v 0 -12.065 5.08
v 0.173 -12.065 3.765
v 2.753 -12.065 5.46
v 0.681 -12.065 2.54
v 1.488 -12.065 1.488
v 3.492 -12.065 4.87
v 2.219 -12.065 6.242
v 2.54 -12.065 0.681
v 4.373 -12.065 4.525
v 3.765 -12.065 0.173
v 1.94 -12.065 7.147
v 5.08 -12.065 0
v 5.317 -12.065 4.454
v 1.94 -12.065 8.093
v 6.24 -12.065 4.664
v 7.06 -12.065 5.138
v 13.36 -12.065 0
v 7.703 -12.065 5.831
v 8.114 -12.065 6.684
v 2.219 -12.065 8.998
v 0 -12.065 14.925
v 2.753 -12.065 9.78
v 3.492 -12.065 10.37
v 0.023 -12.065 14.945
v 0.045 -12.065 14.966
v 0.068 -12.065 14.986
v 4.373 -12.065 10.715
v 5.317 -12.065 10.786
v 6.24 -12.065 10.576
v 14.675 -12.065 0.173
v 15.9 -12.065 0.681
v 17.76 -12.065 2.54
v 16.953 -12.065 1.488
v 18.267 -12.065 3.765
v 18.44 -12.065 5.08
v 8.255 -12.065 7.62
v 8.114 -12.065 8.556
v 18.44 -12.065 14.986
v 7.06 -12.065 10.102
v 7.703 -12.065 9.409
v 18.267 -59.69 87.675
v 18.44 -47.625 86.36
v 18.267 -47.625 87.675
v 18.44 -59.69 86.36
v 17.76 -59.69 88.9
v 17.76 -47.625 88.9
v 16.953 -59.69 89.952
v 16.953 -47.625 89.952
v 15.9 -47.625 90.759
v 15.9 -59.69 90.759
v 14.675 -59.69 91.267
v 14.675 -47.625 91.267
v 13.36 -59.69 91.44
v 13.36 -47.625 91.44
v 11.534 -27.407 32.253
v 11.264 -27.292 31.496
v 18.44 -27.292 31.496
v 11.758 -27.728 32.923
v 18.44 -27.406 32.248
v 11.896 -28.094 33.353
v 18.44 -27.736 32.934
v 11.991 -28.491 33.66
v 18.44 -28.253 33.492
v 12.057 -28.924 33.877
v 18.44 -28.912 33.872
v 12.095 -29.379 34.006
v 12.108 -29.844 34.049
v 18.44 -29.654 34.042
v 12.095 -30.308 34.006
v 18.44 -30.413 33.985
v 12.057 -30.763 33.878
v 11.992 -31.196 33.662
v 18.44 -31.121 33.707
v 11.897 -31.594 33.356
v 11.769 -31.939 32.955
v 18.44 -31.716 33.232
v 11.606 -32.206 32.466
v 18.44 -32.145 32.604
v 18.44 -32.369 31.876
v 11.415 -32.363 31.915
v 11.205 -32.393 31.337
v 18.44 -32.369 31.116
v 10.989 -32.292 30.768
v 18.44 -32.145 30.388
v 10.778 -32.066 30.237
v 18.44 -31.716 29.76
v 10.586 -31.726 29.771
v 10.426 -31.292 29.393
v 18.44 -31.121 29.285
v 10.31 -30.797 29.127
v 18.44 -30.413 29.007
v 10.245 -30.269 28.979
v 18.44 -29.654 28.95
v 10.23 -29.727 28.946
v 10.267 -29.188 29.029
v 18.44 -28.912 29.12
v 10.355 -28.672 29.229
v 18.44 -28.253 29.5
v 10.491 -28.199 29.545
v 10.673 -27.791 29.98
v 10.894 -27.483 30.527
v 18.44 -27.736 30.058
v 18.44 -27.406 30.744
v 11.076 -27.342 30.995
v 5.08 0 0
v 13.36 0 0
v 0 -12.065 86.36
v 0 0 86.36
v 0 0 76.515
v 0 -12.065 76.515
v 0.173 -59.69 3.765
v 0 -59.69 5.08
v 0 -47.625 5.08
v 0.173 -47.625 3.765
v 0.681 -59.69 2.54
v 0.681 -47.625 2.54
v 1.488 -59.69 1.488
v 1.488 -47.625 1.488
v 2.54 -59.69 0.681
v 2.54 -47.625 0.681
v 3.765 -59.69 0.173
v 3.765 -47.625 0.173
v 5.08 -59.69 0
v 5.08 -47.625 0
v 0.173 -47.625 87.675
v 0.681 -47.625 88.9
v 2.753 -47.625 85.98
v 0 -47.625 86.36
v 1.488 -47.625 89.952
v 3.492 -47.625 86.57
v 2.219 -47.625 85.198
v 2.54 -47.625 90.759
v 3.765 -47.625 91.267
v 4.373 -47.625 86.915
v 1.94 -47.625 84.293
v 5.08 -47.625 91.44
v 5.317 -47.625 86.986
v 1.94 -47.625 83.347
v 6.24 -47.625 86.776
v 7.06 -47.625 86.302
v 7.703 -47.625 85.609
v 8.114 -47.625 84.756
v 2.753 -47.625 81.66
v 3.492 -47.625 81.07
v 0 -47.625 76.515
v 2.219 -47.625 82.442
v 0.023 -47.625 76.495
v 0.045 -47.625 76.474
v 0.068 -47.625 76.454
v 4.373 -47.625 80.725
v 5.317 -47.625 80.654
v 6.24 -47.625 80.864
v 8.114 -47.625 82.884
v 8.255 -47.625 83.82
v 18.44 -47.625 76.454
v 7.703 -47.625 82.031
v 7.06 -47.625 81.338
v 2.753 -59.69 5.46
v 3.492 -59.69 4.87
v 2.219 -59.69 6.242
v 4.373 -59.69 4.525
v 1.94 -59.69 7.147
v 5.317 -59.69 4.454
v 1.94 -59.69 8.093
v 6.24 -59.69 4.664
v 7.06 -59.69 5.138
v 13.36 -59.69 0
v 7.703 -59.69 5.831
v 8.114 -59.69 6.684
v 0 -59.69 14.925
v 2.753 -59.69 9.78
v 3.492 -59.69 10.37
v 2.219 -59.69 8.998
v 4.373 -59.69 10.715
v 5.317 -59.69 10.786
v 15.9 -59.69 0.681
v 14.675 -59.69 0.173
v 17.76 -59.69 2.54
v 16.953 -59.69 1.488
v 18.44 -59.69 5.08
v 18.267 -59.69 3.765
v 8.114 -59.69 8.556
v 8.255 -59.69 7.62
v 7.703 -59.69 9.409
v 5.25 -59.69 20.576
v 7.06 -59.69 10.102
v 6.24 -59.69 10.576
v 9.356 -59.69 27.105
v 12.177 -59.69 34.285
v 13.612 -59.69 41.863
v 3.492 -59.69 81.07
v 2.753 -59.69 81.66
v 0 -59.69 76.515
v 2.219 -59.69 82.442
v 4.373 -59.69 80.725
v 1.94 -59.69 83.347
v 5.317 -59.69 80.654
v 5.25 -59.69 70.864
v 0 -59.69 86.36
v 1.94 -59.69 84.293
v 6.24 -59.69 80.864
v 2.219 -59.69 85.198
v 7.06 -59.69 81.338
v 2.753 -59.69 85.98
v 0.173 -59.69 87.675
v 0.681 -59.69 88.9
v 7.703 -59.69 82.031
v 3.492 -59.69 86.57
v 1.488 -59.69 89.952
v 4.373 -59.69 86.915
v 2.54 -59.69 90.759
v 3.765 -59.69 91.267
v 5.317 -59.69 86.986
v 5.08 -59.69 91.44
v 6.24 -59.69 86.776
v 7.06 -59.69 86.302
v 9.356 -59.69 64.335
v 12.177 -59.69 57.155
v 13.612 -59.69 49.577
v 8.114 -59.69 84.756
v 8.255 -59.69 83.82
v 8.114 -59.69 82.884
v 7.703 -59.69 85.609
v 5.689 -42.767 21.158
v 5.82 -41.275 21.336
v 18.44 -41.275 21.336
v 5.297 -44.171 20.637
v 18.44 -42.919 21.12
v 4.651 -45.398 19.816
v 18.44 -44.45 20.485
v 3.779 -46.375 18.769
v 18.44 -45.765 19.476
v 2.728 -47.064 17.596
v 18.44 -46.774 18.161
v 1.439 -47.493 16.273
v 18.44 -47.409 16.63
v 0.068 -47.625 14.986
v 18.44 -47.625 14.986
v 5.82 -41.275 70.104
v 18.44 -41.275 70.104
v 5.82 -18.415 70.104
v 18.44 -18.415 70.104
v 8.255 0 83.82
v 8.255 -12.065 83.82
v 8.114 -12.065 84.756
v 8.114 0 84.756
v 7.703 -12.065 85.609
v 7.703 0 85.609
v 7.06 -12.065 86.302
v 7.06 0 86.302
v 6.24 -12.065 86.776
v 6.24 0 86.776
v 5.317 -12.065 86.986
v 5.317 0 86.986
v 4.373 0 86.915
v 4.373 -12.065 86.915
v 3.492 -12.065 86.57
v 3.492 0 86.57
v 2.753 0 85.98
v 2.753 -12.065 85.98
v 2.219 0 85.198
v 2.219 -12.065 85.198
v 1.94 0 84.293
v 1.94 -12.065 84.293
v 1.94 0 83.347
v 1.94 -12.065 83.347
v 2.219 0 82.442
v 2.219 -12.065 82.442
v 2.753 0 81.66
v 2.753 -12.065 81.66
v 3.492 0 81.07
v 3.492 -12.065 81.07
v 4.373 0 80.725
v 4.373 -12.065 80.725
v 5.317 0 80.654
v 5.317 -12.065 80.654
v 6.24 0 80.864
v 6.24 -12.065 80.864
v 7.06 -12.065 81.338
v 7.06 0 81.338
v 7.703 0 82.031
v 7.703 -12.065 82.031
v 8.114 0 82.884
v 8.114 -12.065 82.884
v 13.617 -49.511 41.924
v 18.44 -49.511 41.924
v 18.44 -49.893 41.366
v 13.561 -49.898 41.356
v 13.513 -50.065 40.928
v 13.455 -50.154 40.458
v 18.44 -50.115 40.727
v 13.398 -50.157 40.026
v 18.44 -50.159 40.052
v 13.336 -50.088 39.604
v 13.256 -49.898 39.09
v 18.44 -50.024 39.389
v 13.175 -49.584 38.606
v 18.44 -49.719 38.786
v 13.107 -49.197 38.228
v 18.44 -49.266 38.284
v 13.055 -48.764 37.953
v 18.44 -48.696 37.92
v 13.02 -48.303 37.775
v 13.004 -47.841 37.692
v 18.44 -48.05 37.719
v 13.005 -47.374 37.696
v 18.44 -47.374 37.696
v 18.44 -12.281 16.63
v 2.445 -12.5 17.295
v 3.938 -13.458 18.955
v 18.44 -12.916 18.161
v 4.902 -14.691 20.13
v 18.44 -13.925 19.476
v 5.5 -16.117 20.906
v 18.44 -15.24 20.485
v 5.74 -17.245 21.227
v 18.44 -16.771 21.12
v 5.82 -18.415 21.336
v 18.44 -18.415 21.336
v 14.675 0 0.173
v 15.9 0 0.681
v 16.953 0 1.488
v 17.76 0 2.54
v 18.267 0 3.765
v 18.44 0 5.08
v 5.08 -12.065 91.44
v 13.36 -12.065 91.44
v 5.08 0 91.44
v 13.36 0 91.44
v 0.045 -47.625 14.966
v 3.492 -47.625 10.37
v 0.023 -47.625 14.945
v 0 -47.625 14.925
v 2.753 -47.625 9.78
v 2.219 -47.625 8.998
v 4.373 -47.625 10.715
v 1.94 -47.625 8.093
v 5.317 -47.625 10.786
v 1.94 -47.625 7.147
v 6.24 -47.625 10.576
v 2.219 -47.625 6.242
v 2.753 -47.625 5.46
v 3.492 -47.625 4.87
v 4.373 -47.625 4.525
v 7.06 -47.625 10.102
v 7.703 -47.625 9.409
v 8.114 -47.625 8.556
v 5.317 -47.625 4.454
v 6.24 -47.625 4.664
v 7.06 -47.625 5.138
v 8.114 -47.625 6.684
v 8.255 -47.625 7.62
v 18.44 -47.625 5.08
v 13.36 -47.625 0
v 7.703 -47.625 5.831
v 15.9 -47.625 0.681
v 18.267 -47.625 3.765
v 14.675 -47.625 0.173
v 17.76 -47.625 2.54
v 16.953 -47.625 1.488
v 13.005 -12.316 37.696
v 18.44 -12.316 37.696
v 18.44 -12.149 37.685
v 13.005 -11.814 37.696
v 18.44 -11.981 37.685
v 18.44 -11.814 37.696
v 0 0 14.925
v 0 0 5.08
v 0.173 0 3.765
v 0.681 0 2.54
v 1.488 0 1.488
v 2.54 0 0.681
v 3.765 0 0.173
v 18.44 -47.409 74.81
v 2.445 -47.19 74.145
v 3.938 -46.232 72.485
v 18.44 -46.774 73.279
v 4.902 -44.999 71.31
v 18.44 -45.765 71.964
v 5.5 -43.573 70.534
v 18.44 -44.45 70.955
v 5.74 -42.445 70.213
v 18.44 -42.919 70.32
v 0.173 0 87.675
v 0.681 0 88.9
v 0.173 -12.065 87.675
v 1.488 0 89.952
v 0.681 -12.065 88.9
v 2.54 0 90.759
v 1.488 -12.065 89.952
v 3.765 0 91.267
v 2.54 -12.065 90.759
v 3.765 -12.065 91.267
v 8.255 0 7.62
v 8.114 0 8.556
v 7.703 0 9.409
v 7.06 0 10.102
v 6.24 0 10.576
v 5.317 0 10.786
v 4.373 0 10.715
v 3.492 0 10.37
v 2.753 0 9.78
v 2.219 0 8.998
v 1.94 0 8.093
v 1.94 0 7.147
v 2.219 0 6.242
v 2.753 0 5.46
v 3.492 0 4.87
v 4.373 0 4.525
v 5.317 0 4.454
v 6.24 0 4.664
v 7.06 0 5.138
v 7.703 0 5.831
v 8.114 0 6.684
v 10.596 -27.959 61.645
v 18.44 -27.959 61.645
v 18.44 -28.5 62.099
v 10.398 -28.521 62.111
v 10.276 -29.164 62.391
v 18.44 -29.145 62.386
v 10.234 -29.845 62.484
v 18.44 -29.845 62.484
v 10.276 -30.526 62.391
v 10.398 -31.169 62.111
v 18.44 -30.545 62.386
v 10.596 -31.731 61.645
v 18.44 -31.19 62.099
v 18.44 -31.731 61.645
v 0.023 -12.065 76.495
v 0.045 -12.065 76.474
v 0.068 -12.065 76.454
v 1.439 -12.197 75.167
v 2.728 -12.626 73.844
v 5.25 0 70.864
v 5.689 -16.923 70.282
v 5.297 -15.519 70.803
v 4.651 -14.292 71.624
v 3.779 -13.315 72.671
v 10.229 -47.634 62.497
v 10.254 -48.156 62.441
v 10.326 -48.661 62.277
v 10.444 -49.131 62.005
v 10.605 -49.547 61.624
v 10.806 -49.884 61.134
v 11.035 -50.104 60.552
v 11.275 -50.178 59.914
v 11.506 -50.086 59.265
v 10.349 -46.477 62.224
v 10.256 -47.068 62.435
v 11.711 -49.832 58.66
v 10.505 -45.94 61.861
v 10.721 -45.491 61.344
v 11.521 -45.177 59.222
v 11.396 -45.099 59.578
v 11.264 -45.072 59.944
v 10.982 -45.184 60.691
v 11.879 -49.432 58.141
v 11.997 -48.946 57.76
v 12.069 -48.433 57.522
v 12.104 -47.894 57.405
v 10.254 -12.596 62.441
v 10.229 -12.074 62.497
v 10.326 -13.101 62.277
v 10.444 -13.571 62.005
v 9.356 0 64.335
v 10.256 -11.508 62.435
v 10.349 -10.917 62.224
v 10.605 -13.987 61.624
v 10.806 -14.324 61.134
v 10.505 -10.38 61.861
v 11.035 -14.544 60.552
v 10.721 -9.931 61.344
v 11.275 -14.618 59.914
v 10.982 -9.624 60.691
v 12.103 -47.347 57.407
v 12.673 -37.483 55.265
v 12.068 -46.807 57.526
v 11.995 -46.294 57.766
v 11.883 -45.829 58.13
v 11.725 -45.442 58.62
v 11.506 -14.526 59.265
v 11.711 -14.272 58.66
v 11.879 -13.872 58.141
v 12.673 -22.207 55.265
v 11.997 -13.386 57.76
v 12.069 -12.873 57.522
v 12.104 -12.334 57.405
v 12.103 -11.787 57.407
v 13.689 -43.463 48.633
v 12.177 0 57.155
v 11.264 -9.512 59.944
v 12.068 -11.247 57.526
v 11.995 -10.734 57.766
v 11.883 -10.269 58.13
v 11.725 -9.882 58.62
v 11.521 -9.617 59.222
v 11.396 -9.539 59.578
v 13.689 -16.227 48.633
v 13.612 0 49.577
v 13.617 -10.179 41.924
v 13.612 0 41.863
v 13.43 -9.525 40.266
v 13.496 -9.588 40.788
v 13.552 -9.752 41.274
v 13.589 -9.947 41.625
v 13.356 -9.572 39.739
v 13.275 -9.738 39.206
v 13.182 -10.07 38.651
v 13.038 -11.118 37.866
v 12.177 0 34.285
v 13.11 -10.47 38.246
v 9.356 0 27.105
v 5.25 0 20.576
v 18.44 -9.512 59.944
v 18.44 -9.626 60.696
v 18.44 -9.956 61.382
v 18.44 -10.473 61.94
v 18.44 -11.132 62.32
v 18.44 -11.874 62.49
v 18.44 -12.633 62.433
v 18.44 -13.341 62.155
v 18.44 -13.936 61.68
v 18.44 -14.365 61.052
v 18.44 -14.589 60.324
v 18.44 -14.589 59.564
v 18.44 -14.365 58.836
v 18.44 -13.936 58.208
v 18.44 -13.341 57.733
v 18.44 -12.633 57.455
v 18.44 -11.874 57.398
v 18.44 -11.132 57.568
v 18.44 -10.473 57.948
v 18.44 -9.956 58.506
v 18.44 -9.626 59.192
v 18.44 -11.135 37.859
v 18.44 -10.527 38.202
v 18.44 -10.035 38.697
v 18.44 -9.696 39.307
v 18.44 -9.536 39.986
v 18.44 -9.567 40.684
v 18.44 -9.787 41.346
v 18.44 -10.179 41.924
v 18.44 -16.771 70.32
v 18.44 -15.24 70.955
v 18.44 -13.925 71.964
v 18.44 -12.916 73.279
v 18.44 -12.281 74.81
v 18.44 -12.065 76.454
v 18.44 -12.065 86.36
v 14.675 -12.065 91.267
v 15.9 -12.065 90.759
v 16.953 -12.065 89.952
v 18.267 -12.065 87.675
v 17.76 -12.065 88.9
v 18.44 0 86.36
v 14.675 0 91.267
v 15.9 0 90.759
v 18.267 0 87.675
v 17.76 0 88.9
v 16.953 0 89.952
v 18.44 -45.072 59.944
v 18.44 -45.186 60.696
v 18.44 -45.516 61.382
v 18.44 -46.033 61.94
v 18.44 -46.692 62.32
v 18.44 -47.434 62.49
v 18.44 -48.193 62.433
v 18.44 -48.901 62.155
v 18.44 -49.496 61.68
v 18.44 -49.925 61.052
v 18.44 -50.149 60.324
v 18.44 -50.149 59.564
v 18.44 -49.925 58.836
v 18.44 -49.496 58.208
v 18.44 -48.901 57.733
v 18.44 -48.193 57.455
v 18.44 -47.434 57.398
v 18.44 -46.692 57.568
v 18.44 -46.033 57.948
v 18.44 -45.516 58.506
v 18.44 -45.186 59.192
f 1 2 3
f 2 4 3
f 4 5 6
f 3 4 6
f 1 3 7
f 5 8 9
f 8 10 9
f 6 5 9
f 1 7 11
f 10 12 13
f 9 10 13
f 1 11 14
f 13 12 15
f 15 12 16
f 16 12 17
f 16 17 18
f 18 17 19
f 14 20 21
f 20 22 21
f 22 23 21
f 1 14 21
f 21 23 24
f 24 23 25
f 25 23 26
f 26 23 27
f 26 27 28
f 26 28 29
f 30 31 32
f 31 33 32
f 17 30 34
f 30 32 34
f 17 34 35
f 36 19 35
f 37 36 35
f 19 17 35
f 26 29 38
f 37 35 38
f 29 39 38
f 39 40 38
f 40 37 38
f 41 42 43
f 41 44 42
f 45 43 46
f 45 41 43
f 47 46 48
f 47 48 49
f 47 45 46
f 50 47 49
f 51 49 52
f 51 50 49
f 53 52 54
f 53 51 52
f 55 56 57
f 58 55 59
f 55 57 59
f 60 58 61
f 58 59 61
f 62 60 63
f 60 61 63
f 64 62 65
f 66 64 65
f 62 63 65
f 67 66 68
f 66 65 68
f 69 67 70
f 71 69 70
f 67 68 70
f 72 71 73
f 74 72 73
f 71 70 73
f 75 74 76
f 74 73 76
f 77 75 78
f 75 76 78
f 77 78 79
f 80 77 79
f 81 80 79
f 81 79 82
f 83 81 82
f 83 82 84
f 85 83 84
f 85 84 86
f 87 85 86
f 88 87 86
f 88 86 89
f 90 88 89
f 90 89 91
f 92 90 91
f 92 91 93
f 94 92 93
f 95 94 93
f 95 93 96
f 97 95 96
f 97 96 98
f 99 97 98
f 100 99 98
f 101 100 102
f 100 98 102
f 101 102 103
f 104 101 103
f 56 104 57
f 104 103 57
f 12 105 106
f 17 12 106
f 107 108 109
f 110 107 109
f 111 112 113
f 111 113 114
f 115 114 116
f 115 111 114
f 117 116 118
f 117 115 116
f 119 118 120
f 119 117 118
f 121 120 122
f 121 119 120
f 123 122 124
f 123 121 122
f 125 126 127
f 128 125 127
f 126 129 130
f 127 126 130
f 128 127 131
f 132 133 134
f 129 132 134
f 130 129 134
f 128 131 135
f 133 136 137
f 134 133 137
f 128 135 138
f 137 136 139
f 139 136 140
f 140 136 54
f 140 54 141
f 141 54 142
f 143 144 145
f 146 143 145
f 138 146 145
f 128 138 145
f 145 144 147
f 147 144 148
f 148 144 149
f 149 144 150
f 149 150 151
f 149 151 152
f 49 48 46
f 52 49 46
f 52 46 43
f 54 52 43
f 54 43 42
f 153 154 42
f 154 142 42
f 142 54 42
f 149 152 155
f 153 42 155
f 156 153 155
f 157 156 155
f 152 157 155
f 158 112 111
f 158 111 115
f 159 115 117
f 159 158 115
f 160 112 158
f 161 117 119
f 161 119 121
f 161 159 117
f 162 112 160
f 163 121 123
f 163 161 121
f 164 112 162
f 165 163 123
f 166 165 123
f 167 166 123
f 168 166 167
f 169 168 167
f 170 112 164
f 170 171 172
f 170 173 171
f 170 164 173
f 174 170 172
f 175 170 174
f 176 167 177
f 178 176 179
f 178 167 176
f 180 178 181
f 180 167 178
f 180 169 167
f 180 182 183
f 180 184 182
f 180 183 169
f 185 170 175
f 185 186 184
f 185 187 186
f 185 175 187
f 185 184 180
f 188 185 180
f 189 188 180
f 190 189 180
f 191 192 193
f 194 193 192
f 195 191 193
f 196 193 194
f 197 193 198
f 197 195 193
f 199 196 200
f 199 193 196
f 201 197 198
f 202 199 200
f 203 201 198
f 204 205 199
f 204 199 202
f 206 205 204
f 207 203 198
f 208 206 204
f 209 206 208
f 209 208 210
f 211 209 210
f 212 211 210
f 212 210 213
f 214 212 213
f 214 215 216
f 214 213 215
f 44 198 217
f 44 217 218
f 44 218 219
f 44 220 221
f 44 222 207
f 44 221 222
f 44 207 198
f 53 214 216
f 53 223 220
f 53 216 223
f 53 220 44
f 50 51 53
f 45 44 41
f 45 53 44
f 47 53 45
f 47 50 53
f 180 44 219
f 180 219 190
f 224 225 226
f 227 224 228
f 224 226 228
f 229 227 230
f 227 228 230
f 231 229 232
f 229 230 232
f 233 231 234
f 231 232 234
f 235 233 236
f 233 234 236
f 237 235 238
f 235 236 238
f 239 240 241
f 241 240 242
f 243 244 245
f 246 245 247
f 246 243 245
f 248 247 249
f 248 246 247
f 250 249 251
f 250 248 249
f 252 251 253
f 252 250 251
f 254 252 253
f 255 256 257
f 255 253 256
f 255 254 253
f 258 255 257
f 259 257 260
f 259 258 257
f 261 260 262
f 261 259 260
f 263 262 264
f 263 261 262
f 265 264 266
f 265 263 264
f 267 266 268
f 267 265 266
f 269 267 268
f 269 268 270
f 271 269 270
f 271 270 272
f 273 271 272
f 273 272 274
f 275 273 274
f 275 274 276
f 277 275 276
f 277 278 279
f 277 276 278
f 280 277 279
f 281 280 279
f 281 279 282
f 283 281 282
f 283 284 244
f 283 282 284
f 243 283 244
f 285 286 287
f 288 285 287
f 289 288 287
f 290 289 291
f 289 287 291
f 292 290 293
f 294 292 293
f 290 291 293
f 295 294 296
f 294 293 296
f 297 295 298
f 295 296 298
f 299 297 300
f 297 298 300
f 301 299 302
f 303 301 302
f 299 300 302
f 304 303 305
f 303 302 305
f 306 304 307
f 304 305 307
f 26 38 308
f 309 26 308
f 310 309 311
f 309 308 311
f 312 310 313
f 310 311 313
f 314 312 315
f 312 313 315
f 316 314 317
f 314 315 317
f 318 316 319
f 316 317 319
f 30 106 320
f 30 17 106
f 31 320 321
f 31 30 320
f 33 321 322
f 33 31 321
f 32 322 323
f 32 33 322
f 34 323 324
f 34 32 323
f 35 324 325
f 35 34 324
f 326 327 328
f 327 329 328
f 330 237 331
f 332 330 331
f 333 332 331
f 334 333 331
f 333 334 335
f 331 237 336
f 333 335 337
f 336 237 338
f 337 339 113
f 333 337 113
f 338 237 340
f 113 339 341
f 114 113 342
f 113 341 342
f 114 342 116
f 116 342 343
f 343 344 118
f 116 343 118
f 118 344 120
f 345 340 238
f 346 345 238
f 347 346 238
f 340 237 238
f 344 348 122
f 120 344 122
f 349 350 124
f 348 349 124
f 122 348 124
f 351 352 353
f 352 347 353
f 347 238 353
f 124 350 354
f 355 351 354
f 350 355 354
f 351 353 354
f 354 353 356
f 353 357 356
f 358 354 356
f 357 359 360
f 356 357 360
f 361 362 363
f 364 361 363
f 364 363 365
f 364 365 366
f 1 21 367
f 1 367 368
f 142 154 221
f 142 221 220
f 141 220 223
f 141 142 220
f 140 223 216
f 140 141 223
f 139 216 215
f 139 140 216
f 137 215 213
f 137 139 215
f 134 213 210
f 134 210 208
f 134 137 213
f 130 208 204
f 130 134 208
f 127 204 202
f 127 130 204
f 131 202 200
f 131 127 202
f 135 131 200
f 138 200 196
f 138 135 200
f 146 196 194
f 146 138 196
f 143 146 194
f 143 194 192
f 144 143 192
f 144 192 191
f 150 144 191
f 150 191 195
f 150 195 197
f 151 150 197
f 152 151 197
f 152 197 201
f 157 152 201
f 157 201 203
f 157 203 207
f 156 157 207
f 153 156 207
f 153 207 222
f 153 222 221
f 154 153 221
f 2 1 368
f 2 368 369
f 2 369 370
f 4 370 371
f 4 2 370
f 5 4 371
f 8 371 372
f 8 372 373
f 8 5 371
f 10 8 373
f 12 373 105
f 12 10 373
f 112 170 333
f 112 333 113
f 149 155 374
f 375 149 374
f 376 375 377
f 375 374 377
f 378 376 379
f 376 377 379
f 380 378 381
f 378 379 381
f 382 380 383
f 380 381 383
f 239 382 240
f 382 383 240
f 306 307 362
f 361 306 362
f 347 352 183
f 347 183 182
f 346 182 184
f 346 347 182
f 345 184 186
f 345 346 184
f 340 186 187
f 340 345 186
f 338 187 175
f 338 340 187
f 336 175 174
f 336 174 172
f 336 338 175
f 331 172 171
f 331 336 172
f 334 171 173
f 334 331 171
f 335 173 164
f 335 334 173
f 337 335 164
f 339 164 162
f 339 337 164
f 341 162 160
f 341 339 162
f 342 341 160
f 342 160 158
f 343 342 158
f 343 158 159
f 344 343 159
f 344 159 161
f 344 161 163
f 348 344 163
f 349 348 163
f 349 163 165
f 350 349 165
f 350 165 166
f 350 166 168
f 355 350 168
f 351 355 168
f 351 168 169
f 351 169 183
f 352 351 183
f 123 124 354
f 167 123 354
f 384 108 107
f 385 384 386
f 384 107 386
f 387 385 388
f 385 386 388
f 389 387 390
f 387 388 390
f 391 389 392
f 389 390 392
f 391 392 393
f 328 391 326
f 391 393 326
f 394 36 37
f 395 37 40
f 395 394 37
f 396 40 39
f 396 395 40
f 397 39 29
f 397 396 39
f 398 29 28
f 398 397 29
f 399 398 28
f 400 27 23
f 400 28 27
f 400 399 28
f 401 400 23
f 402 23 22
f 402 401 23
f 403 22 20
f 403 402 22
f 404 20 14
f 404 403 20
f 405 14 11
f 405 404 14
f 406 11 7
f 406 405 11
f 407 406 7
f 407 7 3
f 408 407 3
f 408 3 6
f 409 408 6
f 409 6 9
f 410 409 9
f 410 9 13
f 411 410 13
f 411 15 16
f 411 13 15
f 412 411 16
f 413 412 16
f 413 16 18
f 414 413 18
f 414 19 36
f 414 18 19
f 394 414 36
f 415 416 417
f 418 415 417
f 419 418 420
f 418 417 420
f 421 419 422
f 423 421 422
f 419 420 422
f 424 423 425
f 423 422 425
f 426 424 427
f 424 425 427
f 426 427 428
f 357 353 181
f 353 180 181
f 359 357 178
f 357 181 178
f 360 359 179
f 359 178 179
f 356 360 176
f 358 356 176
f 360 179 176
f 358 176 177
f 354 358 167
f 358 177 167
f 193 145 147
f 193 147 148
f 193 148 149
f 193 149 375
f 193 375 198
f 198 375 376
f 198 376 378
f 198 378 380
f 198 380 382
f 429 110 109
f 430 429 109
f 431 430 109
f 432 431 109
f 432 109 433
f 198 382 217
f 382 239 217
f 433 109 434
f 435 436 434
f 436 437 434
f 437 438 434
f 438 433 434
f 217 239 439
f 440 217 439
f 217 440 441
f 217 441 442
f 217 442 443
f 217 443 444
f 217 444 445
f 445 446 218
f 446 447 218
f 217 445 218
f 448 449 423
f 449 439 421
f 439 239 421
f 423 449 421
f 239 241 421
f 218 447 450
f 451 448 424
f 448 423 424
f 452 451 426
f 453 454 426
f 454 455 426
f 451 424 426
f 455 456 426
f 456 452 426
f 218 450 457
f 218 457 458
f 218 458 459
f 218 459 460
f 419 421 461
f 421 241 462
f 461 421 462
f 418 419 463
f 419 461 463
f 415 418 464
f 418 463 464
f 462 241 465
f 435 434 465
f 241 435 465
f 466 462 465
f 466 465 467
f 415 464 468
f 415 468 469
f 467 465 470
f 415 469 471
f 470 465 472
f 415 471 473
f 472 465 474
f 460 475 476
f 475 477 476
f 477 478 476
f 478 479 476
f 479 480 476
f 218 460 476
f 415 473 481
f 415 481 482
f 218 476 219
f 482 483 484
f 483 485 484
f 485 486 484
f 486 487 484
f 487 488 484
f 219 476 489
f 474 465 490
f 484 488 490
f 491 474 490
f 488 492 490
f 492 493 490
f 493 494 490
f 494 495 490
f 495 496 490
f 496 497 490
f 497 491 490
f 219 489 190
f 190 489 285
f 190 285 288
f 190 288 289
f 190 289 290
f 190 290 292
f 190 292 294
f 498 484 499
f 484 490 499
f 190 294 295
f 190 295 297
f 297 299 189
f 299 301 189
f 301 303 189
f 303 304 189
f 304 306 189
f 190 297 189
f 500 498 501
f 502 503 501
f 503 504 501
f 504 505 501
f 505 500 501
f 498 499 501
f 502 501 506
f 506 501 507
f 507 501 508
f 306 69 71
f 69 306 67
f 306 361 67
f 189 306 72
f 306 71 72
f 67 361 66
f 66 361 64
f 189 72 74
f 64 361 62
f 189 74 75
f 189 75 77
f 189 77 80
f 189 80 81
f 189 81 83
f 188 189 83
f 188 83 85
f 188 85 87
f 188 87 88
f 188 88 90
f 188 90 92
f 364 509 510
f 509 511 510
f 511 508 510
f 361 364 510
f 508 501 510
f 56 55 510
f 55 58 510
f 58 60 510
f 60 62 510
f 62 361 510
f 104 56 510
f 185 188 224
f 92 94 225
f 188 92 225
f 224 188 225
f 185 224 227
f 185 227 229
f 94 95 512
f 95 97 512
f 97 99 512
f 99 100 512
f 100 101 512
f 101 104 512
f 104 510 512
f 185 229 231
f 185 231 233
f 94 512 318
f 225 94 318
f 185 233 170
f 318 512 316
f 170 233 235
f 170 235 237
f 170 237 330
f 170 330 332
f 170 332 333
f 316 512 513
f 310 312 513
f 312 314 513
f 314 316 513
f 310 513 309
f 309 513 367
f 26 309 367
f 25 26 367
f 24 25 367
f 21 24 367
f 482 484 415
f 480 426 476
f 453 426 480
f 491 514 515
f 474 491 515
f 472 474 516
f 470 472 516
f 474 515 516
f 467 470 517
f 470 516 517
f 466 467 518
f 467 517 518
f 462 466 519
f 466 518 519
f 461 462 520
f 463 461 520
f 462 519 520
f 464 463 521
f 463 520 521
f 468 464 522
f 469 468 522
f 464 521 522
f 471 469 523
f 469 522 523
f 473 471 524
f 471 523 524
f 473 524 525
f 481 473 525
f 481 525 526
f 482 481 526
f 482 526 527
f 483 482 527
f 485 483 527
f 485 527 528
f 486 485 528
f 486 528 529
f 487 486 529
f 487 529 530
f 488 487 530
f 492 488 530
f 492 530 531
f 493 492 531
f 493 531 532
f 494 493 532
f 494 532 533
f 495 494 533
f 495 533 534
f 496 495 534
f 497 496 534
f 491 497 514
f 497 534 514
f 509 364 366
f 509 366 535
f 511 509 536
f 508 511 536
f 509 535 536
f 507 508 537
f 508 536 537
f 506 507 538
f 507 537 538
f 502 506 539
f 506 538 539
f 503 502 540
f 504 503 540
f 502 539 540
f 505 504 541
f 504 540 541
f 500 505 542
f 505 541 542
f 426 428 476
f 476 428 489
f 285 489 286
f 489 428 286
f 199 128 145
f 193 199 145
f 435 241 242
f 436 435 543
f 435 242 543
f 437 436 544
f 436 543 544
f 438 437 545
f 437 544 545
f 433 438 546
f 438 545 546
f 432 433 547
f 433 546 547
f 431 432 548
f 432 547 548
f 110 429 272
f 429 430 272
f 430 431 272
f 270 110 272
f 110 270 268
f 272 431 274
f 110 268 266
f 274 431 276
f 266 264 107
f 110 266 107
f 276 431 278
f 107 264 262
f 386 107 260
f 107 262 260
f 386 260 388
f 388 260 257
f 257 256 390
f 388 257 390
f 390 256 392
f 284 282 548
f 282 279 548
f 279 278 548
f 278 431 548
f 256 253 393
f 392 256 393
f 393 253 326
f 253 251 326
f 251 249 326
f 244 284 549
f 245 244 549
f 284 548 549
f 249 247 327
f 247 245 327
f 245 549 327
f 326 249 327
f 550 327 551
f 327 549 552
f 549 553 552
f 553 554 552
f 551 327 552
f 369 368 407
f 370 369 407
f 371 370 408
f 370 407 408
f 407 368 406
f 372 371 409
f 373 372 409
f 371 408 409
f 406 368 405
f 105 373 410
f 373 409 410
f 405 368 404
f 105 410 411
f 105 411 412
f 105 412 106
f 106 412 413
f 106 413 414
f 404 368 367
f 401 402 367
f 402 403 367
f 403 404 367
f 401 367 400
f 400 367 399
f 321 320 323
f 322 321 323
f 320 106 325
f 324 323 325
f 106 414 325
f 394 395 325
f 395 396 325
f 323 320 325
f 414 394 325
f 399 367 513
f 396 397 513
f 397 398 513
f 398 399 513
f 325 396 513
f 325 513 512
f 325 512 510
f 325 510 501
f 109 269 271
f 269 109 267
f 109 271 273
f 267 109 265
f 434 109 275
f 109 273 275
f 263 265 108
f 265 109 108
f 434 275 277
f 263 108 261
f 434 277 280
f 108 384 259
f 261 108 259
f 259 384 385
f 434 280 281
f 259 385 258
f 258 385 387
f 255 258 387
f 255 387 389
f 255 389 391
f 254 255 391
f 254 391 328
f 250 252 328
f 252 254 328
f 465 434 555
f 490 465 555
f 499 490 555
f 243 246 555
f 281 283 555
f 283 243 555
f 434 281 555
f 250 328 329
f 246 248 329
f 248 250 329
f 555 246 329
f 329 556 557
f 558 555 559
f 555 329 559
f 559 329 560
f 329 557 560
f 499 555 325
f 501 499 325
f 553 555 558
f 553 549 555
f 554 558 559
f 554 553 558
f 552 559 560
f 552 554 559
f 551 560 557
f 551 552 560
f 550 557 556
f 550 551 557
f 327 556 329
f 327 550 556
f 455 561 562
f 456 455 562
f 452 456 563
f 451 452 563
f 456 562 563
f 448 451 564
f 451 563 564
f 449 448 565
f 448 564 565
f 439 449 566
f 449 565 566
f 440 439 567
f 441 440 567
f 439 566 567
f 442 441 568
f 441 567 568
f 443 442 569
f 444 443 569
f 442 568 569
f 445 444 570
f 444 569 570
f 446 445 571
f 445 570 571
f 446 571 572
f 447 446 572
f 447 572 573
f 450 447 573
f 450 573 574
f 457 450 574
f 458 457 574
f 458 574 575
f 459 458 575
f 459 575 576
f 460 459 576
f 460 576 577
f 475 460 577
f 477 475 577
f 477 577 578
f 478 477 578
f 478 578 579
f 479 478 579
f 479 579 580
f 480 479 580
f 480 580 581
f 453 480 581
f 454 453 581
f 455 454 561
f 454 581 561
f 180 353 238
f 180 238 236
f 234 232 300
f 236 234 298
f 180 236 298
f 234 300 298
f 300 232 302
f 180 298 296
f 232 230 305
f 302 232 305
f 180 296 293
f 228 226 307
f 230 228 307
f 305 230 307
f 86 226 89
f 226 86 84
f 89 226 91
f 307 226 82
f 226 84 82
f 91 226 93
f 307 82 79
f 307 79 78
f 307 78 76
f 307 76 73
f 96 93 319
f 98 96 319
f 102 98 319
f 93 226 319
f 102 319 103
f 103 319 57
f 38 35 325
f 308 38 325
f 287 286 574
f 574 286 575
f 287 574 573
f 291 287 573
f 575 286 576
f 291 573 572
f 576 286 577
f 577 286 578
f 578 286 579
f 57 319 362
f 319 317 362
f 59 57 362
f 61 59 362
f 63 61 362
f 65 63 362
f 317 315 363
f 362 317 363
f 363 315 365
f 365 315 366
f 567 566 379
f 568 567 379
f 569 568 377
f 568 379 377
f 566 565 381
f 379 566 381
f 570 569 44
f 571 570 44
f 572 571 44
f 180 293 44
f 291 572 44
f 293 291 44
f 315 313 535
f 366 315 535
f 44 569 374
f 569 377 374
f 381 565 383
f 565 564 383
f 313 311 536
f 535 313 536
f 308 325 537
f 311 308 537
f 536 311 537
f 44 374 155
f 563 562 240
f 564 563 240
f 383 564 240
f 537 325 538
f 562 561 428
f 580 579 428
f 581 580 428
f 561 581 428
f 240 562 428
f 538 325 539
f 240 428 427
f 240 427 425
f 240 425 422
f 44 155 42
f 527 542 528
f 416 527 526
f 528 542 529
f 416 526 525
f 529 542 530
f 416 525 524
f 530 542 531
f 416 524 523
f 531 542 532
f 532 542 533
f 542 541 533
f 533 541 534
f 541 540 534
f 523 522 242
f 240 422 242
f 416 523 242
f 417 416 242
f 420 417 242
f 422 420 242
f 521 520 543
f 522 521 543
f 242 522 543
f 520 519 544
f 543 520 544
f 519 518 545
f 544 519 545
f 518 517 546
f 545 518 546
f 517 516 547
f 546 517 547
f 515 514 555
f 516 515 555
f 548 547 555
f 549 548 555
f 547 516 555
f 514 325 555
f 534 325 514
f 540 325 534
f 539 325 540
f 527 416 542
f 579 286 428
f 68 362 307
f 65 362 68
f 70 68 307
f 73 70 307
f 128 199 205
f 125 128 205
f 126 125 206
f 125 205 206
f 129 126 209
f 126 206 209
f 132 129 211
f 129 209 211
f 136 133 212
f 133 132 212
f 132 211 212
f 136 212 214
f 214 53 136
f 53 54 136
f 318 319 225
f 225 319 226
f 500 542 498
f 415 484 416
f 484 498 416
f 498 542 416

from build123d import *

# Parameters (mm, degrees)
F0_R     = 3.175
F1_DEPTH = 59.69
F2_R     = 5.08
F3_R     = 2.5527
F4_DEPTH = 18.4414
F5_R     = 5.08


with BuildPart() as f1:
    # F0 (on Front) → F1 (new body)
    with BuildSketch(Plane.XZ):
        with BuildLine():
            Line((0, 14.925174), (0, 0))
            Line((0, 0), (18.4404, 0))
            Line((18.4404, 0), (18.4404, 91.44))
            Line((18.4404, 91.44), (0, 91.44))
            Line((0, 91.44), (0, 76.514826))
            ThreePointArc((0, 76.514826), (13.7922, 45.72), (0, 14.925174))
        make_face()
        with Locations((5.08, 7.62)):
            Circle(F0_R, mode=Mode.SUBTRACT)
        with Locations((5.08, 83.82)):
            Circle(F0_R, mode=Mode.SUBTRACT)
    extrude(amount=F1_DEPTH)

    # F2
    f2_edges = [f1.edges().sort_by_distance(p)[0] for p in [
        (0, -29.845, 91.44),
        (0, -29.845, 0),
    ]]
    fillet(f2_edges, radius=F2_R)

    # F3 (on face) → F4 (cut, through all)
    with BuildSketch(Plane.YZ.offset(18.4404)):
        with Locations((-47.625, 59.944)):
            Circle(F3_R)
        with Locations((-12.065, 59.944)):
            Circle(F3_R)
        with Locations((-29.845, 31.496)):
            Circle(F3_R)
        with BuildLine():
            Line((-12.065, 91.44), (-47.625, 91.44))
            Line((-47.625, 91.44), (-47.625, 76.454))
            ThreePointArc((-47.625, 76.454), (-45.765128, 71.963872), (-41.275, 70.104))
            Line((-41.275, 70.104), (-18.415, 70.104))
            ThreePointArc((-18.415, 70.104), (-13.924872, 71.963872), (-12.065, 76.454))
            Line((-12.065, 76.454), (-12.065, 91.44))
        make_face()
        with BuildLine():
            Line((-47.625, 14.986), (-47.625, 0))
            Line((-47.625, 0), (-12.065, 0))
            Line((-12.065, 0), (-12.065, 14.986))
            ThreePointArc((-12.065, 14.986), (-13.924872, 19.476128), (-18.415, 21.336))
            Line((-18.415, 21.336), (-41.275, 21.336))
            ThreePointArc((-41.275, 21.336), (-45.765128, 19.476128), (-47.625, 14.986))
        make_face()
        with BuildLine():
            Line((-10.178521, 41.924013), (-27.958521, 61.644822))
            ThreePointArc((-27.958521, 61.644822), (-29.845, 62.484), (-31.731479, 61.644822))
            Line((-31.731479, 61.644822), (-49.511479, 41.924013))
            ThreePointArc((-49.511479, 41.924013), (-49.891828, 39.07729), (-47.373991, 37.695624))
            Line((-47.373991, 37.695624), (-12.316009, 37.695624))
            Line((-12.316009, 37.695624), (-11.813991, 37.695624))
            ThreePointArc((-11.813991, 37.695624), (-9.696027, 39.306912), (-10.178521, 41.924013))
        make_face()
        with BuildLine():
            ThreePointArc((-12.316009, 37.695624), (-12.065, 37.683191), (-11.813991, 37.695624))
            Line((-11.813991, 37.695624), (-12.316009, 37.695624))
        make_face()
    extrude(amount=-F4_DEPTH, mode=Mode.SUBTRACT)

    # F5
    f5_edges = [f1.edges().sort_by_distance(p)[0] for p in [
        (18.4404, -53.6575, 91.44),
        (18.4404, -6.0325, 91.44),
        (18.4404, -53.6575, 0),
        (18.4404, -6.0325, 0),
    ]]
    fillet(f5_edges, radius=F5_R)


solid = f1.part
